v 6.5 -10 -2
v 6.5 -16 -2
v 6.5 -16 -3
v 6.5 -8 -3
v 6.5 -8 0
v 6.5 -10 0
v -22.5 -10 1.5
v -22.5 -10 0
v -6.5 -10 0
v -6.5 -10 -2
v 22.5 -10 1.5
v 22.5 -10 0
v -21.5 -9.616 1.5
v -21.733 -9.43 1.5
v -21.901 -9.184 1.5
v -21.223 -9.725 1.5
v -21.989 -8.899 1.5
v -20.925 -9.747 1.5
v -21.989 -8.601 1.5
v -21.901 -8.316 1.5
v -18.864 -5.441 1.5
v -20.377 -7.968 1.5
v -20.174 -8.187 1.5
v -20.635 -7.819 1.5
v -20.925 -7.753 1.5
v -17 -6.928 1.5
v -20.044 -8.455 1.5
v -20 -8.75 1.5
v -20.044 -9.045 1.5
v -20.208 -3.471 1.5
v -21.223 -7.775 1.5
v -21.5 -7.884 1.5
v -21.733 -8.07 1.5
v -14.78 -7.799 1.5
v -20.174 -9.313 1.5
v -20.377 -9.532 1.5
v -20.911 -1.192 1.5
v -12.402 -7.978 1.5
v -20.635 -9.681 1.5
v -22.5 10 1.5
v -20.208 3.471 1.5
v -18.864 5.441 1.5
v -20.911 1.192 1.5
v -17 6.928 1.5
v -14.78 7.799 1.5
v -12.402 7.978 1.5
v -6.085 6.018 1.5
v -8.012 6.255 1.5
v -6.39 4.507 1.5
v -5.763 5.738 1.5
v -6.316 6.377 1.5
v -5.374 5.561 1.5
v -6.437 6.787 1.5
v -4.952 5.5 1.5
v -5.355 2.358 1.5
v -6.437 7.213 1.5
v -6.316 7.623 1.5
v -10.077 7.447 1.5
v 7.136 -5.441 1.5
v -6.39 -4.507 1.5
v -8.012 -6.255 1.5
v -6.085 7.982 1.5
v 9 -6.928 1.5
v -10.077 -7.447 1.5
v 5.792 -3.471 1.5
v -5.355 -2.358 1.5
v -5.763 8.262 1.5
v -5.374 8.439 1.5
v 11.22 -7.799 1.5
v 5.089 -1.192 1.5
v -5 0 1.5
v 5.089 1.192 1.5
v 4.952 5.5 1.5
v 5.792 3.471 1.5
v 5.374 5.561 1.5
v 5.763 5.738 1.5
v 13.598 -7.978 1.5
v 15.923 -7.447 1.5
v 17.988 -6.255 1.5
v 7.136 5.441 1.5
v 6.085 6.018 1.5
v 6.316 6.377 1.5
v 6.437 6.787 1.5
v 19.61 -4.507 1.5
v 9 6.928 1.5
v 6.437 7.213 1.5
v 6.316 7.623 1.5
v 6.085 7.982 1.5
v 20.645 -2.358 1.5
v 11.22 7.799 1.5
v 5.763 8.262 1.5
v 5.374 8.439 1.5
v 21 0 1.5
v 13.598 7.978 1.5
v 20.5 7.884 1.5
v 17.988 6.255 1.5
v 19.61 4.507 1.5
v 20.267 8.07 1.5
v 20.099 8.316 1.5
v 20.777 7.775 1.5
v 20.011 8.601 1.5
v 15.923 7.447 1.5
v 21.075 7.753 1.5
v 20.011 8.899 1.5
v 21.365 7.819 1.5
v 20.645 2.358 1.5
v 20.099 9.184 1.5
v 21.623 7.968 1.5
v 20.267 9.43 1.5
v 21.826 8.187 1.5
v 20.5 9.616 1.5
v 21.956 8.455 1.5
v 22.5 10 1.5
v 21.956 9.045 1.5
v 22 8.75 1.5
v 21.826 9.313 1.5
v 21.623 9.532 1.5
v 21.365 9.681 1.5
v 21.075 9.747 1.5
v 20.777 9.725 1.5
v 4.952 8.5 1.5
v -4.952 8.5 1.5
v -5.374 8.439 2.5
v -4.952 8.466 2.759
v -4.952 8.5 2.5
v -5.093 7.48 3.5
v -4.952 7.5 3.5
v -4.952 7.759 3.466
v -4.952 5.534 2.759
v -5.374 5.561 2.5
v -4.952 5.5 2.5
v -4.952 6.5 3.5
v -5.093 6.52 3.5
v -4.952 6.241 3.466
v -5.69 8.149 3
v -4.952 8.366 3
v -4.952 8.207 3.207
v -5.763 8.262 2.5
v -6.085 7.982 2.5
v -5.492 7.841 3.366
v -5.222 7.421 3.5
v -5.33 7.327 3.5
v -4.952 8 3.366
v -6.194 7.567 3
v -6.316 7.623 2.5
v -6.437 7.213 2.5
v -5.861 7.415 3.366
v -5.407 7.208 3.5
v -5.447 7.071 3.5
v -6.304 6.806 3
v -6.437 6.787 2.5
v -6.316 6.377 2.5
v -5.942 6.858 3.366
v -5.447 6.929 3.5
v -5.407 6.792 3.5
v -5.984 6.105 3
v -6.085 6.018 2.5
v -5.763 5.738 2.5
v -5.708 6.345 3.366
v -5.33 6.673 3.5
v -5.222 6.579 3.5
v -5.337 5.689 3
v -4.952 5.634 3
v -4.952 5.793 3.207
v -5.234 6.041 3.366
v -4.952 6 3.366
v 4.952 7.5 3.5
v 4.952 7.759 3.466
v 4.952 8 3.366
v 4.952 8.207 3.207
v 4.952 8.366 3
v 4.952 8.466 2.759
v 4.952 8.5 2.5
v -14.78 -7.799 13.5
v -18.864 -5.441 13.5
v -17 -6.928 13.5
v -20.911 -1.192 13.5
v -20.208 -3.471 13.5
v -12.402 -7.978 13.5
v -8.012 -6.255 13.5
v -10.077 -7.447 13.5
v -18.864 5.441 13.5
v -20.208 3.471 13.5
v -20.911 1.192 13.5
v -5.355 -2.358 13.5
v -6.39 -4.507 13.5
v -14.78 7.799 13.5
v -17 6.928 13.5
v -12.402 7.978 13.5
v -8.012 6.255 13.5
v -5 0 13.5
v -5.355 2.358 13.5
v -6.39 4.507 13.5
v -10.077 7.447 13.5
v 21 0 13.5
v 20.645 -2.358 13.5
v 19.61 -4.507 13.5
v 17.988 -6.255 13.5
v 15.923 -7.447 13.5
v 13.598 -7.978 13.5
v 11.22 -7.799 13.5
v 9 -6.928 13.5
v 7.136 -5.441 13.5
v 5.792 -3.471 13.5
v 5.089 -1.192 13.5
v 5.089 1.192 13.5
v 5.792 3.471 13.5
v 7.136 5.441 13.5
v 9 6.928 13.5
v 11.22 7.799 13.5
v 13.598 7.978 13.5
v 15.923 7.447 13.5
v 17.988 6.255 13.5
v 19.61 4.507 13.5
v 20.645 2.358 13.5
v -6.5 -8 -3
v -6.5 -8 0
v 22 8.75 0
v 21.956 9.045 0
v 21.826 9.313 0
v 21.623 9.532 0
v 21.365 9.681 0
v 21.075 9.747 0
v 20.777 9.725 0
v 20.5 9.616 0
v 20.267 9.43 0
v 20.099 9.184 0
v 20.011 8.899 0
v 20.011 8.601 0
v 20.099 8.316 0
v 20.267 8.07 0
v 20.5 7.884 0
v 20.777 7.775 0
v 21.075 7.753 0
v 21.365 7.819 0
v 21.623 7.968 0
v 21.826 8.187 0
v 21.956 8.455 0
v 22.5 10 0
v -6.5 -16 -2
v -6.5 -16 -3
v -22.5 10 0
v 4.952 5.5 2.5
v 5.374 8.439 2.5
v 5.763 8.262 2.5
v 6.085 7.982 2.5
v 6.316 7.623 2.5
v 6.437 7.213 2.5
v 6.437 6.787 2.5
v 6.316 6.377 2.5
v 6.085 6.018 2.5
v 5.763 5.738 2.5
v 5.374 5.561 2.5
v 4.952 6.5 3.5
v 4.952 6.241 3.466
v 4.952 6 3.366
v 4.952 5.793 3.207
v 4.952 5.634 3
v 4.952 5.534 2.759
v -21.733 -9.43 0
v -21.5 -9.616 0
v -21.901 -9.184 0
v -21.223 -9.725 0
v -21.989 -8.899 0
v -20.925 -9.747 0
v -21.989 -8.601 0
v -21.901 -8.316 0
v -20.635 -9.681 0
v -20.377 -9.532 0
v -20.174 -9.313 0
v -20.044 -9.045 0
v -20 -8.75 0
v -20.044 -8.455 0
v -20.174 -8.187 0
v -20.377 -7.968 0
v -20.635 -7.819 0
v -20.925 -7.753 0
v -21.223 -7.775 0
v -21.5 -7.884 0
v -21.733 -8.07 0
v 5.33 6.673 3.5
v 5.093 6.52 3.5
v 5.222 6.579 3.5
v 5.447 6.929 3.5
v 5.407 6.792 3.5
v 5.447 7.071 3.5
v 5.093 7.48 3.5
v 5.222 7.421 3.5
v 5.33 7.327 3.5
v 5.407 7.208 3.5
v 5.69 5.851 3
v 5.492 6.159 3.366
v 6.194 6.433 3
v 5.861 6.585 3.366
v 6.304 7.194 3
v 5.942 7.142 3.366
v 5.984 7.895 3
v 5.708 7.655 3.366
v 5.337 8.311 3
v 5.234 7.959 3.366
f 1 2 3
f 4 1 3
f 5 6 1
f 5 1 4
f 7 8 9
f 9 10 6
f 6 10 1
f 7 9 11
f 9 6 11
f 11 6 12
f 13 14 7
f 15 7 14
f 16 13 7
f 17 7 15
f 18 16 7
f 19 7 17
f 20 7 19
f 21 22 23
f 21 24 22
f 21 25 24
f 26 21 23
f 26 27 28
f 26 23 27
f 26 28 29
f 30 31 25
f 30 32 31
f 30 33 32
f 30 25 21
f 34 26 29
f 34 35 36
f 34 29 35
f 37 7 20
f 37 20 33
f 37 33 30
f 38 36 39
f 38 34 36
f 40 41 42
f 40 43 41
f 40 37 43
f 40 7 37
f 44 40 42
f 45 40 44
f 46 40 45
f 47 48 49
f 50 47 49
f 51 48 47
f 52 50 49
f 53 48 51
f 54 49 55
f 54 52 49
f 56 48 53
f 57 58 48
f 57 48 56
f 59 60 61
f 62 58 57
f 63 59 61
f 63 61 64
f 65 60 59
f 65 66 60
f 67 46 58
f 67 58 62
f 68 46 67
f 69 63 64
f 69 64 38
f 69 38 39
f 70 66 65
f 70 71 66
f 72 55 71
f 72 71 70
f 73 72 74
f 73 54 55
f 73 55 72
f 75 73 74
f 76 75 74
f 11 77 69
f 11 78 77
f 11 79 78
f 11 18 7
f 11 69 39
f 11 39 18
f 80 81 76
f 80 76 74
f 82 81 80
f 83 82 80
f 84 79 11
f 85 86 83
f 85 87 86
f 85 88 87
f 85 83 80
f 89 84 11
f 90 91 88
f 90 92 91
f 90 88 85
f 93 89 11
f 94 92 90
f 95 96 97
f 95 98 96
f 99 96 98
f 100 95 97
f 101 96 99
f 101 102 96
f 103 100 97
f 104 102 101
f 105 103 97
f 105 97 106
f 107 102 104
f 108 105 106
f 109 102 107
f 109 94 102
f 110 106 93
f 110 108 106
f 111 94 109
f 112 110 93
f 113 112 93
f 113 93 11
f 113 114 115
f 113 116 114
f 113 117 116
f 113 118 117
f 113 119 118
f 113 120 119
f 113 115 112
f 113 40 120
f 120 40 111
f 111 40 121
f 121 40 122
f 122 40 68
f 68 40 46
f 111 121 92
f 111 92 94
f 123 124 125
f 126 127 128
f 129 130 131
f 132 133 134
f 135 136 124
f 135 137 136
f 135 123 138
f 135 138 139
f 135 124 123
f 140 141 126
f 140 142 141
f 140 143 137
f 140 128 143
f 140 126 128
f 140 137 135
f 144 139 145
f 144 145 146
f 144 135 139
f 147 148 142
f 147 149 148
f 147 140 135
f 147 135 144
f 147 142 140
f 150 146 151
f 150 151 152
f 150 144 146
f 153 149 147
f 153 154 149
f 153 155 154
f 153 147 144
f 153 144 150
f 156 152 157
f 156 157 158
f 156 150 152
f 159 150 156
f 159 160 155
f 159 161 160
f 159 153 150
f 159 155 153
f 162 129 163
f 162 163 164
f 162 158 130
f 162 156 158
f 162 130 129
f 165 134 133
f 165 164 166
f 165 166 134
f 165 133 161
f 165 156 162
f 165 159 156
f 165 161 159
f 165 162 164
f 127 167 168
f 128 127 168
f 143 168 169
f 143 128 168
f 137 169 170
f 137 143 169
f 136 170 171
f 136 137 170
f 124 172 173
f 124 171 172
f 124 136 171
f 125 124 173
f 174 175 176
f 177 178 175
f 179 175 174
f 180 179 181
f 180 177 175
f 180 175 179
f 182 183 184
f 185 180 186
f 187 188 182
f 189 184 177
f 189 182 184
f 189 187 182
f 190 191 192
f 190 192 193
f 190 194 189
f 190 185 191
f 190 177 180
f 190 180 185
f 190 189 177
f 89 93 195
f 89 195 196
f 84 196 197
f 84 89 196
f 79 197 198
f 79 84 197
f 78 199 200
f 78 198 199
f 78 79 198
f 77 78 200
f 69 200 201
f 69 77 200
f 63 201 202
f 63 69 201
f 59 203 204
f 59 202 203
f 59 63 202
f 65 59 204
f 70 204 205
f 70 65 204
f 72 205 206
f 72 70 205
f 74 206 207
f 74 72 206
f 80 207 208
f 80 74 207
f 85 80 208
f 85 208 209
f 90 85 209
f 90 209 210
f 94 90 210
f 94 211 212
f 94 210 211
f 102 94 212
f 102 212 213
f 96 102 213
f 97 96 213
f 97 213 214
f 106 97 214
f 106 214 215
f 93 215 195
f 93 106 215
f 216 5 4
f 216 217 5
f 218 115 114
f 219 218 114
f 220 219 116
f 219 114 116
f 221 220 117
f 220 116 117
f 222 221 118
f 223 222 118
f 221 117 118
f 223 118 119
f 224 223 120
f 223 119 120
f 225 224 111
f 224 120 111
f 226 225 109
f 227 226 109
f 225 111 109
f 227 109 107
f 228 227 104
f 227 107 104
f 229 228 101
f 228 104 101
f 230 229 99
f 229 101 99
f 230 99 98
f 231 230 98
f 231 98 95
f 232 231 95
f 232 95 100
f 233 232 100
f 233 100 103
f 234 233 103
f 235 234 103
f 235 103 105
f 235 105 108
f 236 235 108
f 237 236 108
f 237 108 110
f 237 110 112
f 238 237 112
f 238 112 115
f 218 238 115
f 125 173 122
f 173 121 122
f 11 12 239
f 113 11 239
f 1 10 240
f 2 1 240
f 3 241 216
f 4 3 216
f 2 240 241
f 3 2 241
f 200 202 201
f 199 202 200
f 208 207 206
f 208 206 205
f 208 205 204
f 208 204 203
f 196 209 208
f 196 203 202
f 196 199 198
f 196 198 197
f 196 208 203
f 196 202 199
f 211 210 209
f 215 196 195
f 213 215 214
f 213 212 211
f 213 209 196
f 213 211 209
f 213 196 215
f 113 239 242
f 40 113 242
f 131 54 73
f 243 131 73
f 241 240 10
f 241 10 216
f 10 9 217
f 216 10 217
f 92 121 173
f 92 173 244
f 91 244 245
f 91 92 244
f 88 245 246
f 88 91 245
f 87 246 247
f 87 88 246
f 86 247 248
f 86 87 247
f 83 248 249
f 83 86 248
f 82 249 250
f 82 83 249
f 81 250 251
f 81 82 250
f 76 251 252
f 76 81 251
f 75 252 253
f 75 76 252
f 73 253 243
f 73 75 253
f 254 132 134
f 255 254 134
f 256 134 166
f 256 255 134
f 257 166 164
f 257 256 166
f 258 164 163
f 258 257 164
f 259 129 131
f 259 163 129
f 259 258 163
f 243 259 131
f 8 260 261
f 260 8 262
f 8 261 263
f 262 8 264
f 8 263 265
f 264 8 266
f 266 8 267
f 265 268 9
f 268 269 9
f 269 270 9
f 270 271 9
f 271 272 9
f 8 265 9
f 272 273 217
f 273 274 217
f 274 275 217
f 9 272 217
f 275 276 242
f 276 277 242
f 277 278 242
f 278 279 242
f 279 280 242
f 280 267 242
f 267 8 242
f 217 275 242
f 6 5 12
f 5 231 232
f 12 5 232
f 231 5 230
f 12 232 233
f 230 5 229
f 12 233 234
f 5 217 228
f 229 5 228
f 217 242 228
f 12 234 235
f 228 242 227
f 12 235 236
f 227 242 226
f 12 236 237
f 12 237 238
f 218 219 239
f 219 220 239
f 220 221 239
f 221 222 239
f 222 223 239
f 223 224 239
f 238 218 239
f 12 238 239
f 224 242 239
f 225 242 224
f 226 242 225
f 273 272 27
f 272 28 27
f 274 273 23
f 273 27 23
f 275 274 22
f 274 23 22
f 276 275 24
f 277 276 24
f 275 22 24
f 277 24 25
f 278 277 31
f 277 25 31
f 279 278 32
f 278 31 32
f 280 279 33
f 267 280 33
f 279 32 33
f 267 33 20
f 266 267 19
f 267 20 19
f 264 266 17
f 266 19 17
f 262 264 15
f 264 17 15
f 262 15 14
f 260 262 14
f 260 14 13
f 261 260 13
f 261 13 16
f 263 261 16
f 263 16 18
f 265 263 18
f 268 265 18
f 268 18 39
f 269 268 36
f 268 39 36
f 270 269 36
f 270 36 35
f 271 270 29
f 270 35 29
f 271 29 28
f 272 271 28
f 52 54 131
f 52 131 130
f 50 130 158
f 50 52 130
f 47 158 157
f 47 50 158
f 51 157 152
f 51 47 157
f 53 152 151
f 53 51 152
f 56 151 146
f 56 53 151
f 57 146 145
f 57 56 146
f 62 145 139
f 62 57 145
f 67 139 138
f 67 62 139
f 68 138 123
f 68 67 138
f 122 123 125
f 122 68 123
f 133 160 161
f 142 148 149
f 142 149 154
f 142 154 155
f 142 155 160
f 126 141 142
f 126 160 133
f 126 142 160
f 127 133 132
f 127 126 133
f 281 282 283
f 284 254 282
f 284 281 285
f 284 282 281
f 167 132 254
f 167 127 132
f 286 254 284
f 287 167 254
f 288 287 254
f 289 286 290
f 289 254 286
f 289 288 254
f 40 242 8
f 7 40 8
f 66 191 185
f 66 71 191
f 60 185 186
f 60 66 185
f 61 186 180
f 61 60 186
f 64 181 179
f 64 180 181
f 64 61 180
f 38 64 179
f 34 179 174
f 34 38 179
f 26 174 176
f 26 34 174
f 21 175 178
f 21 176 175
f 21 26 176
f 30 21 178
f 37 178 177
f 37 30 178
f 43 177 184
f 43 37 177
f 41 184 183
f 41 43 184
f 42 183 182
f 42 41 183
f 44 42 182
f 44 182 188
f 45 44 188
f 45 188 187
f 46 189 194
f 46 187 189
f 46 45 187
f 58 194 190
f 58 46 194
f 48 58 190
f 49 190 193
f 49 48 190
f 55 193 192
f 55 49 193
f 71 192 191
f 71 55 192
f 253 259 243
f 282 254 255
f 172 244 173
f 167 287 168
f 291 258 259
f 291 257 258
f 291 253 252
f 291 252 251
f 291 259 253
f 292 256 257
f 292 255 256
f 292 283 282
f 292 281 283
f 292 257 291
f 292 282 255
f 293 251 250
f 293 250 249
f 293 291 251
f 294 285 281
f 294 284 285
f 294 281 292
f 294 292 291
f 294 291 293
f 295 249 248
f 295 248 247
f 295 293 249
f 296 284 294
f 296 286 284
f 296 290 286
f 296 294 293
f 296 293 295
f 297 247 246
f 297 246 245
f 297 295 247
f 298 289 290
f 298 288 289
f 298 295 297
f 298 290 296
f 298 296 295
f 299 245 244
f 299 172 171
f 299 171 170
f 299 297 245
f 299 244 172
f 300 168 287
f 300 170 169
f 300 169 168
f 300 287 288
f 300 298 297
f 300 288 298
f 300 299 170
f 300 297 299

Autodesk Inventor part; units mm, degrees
ref_plane "YZ Plane" through (0, 0, 0) normal (1, 0, 0) x (0, 1, 0)
ref_plane "XZ Plane" through (0, 0, 0) normal (0, 1, 0) x (-1, 0, 0)
ref_plane "XY Plane" through (0, 0, 0) normal (0, 0, 1) x (1, 0, 0)
sketch "Náčrt1" plane through (0, 0, 0) normal (0, 0, 1) x (1, 0, 0)
  line L0 (-22.5, -10) -> (22.5, -10)
  line L1 (22.5, -10) -> (22.5, 10)
  line L2 (22.5, 10) -> (-22.5, 10)
  line L3 (-22.5, 10) -> (-22.5, -10)
  line L4 (-22.5, -10) -> (22.5, 10) construction
  line L5 (22.5, -10) -> (-22.5, 10) construction
  point P0 (0, 0)
  dimension "d0" = 45
  dimension "d1" = 20
extrude "Vysunutí1" add sketch "Náčrt1" along normal blind 1.5
sketch "Náčrt2" plane through (0, 0, 1.5) normal (0, 0, 1) x (1, 0, 0)
  circle A0 centre (13, 0) radius 8
  circle A1 centre (-13, 0) radius 8
  point P0 (0, 0)
  dimension "d4" = 16
  dimension "d5" = 16
  dimension "d6" = 26
  dimension "d7" = 13
extrude "Vysunutí2" add sketch "Náčrt2" along normal blind 12
sketch "Náčrt3" plane through (0, 0, 1.5) normal (0, 0, 1) x (1, 0, 0)
  line L0 (-4.9518, 7) -> (4.9518, 7) construction
  line L1 (-4.9518, 5.5) -> (4.9518, 5.5)
  line L2 (4.9518, 8.5) -> (-4.9518, 8.5)
  arc A0 (-4.9518, 8.5) -> (-4.9518, 5.5) centre (-4.9518, 7) ccw
  arc A1 (4.9518, 5.5) -> (4.9518, 8.5) centre (4.9518, 7) ccw
  point P0 (0, 0)
  point P1 (0, 7)
  dimension "d10" = 3
  dimension "d11" = 7
extrude "Vysunutí3" add sketch "Náčrt3" along normal blind 2
fillet "Zaoblení1" radius 1 4 edges at (0, 8.5, 3.5) (-6.4518, 7, 3.5) (0, 5.5, 3.5) (6.4518, 7, 3.5)
sketch "Náčrt4" plane through (0, 0, 1.5) normal (0, 0, 1) x (1, 0, 0)
  circle A0 centre (21, 8.75) radius 1
  circle A1 centre (-21, -8.75) radius 1
  point P0 (0, 0)
  dimension "d15" = 2
  dimension "d16" = 2
  dimension "d17" = 17.5
  dimension "d18" = 42
  dimension "d19" = 8.75
  dimension "d20" = 21
extrude "Vysunutí4" cut sketch "Náčrt4" against normal through all
sketch "Náčrt6" plane through (0, 0, 0) normal (1, 0, 0) x (0, 1, 0)
  line L0 (-10, 0) -> (10, 0) projected
  line L1 (-10, 0) -> (-8, 0)
  line L2 (-8, 0) -> (-8, -2)
  line L3 (-8, -2) -> (-10, -2)
  line L4 (-10, -2) -> (-10, 0)
  line L5 (-8, -2) -> (-16, -2)
  line L6 (-16, -2) -> (-16, -3)
  line L7 (-16, -3) -> (-8, -3)
  line L8 (-8, -3) -> (-8, -2)
  point P0 (0, 0)
  dimension "d23" = 2
  dimension "d24" = 2
  dimension "d25" = 8
  dimension "d26" = 1
extrude "Vysunutí5" add sketch "Náčrt6" along normal mid plane 13
properties part number "UltraZvuk"
